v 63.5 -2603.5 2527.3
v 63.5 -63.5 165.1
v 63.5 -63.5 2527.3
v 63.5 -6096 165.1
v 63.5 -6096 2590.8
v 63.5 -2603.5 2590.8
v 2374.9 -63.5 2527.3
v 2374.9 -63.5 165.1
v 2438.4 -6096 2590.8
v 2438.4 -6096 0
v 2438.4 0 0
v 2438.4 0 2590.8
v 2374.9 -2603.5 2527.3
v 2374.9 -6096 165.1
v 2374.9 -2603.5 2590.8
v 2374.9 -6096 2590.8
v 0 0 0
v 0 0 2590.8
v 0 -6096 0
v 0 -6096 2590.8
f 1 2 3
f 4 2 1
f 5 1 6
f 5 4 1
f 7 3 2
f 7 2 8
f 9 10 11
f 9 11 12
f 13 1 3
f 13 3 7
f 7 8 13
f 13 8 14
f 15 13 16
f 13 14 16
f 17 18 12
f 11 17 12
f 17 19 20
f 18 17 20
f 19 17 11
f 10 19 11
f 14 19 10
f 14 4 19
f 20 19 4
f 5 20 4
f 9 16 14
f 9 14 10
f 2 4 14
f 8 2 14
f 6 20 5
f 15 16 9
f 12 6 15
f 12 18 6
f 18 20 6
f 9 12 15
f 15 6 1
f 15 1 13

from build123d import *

# Parameters (mm, degrees)
F0_W     = 2438.4
F0_H     = 2590.8
F1_DEPTH = 6096
F2_W     = 2311.4
F2_H     = 2425.7
F3_DEPTH = 6032.5
F4_W     = 2311.4
F4_H     = 63.5
F5_DEPTH = 2540


# Not quite as in the source:
# - a feature names something its author has since deleted; it is built from what else it names


with BuildPart() as f1:
    # F0 (on Front) → F1 (new body)
    with BuildSketch(Plane.XZ):
        with Locations((1219.2, 1295.4)):
            Rectangle(F0_W, F0_H)
    extrude(amount=F1_DEPTH)

    # F2 (on face) → F3 (cut)
    with BuildSketch(Plane.XZ.offset(6096)):
        with Locations((1219.2, 1377.95)):
            Rectangle(F2_W, F2_H)
    extrude(amount=-F3_DEPTH, mode=Mode.SUBTRACT)

    # F4 (on face) → F5 (join)
    with BuildSketch(Plane.XZ.offset(63.5)):
        with Locations((1219.2, 2559.05)):
            Rectangle(F4_W, F4_H)
    extrude(amount=F5_DEPTH)


solid = f1.part
